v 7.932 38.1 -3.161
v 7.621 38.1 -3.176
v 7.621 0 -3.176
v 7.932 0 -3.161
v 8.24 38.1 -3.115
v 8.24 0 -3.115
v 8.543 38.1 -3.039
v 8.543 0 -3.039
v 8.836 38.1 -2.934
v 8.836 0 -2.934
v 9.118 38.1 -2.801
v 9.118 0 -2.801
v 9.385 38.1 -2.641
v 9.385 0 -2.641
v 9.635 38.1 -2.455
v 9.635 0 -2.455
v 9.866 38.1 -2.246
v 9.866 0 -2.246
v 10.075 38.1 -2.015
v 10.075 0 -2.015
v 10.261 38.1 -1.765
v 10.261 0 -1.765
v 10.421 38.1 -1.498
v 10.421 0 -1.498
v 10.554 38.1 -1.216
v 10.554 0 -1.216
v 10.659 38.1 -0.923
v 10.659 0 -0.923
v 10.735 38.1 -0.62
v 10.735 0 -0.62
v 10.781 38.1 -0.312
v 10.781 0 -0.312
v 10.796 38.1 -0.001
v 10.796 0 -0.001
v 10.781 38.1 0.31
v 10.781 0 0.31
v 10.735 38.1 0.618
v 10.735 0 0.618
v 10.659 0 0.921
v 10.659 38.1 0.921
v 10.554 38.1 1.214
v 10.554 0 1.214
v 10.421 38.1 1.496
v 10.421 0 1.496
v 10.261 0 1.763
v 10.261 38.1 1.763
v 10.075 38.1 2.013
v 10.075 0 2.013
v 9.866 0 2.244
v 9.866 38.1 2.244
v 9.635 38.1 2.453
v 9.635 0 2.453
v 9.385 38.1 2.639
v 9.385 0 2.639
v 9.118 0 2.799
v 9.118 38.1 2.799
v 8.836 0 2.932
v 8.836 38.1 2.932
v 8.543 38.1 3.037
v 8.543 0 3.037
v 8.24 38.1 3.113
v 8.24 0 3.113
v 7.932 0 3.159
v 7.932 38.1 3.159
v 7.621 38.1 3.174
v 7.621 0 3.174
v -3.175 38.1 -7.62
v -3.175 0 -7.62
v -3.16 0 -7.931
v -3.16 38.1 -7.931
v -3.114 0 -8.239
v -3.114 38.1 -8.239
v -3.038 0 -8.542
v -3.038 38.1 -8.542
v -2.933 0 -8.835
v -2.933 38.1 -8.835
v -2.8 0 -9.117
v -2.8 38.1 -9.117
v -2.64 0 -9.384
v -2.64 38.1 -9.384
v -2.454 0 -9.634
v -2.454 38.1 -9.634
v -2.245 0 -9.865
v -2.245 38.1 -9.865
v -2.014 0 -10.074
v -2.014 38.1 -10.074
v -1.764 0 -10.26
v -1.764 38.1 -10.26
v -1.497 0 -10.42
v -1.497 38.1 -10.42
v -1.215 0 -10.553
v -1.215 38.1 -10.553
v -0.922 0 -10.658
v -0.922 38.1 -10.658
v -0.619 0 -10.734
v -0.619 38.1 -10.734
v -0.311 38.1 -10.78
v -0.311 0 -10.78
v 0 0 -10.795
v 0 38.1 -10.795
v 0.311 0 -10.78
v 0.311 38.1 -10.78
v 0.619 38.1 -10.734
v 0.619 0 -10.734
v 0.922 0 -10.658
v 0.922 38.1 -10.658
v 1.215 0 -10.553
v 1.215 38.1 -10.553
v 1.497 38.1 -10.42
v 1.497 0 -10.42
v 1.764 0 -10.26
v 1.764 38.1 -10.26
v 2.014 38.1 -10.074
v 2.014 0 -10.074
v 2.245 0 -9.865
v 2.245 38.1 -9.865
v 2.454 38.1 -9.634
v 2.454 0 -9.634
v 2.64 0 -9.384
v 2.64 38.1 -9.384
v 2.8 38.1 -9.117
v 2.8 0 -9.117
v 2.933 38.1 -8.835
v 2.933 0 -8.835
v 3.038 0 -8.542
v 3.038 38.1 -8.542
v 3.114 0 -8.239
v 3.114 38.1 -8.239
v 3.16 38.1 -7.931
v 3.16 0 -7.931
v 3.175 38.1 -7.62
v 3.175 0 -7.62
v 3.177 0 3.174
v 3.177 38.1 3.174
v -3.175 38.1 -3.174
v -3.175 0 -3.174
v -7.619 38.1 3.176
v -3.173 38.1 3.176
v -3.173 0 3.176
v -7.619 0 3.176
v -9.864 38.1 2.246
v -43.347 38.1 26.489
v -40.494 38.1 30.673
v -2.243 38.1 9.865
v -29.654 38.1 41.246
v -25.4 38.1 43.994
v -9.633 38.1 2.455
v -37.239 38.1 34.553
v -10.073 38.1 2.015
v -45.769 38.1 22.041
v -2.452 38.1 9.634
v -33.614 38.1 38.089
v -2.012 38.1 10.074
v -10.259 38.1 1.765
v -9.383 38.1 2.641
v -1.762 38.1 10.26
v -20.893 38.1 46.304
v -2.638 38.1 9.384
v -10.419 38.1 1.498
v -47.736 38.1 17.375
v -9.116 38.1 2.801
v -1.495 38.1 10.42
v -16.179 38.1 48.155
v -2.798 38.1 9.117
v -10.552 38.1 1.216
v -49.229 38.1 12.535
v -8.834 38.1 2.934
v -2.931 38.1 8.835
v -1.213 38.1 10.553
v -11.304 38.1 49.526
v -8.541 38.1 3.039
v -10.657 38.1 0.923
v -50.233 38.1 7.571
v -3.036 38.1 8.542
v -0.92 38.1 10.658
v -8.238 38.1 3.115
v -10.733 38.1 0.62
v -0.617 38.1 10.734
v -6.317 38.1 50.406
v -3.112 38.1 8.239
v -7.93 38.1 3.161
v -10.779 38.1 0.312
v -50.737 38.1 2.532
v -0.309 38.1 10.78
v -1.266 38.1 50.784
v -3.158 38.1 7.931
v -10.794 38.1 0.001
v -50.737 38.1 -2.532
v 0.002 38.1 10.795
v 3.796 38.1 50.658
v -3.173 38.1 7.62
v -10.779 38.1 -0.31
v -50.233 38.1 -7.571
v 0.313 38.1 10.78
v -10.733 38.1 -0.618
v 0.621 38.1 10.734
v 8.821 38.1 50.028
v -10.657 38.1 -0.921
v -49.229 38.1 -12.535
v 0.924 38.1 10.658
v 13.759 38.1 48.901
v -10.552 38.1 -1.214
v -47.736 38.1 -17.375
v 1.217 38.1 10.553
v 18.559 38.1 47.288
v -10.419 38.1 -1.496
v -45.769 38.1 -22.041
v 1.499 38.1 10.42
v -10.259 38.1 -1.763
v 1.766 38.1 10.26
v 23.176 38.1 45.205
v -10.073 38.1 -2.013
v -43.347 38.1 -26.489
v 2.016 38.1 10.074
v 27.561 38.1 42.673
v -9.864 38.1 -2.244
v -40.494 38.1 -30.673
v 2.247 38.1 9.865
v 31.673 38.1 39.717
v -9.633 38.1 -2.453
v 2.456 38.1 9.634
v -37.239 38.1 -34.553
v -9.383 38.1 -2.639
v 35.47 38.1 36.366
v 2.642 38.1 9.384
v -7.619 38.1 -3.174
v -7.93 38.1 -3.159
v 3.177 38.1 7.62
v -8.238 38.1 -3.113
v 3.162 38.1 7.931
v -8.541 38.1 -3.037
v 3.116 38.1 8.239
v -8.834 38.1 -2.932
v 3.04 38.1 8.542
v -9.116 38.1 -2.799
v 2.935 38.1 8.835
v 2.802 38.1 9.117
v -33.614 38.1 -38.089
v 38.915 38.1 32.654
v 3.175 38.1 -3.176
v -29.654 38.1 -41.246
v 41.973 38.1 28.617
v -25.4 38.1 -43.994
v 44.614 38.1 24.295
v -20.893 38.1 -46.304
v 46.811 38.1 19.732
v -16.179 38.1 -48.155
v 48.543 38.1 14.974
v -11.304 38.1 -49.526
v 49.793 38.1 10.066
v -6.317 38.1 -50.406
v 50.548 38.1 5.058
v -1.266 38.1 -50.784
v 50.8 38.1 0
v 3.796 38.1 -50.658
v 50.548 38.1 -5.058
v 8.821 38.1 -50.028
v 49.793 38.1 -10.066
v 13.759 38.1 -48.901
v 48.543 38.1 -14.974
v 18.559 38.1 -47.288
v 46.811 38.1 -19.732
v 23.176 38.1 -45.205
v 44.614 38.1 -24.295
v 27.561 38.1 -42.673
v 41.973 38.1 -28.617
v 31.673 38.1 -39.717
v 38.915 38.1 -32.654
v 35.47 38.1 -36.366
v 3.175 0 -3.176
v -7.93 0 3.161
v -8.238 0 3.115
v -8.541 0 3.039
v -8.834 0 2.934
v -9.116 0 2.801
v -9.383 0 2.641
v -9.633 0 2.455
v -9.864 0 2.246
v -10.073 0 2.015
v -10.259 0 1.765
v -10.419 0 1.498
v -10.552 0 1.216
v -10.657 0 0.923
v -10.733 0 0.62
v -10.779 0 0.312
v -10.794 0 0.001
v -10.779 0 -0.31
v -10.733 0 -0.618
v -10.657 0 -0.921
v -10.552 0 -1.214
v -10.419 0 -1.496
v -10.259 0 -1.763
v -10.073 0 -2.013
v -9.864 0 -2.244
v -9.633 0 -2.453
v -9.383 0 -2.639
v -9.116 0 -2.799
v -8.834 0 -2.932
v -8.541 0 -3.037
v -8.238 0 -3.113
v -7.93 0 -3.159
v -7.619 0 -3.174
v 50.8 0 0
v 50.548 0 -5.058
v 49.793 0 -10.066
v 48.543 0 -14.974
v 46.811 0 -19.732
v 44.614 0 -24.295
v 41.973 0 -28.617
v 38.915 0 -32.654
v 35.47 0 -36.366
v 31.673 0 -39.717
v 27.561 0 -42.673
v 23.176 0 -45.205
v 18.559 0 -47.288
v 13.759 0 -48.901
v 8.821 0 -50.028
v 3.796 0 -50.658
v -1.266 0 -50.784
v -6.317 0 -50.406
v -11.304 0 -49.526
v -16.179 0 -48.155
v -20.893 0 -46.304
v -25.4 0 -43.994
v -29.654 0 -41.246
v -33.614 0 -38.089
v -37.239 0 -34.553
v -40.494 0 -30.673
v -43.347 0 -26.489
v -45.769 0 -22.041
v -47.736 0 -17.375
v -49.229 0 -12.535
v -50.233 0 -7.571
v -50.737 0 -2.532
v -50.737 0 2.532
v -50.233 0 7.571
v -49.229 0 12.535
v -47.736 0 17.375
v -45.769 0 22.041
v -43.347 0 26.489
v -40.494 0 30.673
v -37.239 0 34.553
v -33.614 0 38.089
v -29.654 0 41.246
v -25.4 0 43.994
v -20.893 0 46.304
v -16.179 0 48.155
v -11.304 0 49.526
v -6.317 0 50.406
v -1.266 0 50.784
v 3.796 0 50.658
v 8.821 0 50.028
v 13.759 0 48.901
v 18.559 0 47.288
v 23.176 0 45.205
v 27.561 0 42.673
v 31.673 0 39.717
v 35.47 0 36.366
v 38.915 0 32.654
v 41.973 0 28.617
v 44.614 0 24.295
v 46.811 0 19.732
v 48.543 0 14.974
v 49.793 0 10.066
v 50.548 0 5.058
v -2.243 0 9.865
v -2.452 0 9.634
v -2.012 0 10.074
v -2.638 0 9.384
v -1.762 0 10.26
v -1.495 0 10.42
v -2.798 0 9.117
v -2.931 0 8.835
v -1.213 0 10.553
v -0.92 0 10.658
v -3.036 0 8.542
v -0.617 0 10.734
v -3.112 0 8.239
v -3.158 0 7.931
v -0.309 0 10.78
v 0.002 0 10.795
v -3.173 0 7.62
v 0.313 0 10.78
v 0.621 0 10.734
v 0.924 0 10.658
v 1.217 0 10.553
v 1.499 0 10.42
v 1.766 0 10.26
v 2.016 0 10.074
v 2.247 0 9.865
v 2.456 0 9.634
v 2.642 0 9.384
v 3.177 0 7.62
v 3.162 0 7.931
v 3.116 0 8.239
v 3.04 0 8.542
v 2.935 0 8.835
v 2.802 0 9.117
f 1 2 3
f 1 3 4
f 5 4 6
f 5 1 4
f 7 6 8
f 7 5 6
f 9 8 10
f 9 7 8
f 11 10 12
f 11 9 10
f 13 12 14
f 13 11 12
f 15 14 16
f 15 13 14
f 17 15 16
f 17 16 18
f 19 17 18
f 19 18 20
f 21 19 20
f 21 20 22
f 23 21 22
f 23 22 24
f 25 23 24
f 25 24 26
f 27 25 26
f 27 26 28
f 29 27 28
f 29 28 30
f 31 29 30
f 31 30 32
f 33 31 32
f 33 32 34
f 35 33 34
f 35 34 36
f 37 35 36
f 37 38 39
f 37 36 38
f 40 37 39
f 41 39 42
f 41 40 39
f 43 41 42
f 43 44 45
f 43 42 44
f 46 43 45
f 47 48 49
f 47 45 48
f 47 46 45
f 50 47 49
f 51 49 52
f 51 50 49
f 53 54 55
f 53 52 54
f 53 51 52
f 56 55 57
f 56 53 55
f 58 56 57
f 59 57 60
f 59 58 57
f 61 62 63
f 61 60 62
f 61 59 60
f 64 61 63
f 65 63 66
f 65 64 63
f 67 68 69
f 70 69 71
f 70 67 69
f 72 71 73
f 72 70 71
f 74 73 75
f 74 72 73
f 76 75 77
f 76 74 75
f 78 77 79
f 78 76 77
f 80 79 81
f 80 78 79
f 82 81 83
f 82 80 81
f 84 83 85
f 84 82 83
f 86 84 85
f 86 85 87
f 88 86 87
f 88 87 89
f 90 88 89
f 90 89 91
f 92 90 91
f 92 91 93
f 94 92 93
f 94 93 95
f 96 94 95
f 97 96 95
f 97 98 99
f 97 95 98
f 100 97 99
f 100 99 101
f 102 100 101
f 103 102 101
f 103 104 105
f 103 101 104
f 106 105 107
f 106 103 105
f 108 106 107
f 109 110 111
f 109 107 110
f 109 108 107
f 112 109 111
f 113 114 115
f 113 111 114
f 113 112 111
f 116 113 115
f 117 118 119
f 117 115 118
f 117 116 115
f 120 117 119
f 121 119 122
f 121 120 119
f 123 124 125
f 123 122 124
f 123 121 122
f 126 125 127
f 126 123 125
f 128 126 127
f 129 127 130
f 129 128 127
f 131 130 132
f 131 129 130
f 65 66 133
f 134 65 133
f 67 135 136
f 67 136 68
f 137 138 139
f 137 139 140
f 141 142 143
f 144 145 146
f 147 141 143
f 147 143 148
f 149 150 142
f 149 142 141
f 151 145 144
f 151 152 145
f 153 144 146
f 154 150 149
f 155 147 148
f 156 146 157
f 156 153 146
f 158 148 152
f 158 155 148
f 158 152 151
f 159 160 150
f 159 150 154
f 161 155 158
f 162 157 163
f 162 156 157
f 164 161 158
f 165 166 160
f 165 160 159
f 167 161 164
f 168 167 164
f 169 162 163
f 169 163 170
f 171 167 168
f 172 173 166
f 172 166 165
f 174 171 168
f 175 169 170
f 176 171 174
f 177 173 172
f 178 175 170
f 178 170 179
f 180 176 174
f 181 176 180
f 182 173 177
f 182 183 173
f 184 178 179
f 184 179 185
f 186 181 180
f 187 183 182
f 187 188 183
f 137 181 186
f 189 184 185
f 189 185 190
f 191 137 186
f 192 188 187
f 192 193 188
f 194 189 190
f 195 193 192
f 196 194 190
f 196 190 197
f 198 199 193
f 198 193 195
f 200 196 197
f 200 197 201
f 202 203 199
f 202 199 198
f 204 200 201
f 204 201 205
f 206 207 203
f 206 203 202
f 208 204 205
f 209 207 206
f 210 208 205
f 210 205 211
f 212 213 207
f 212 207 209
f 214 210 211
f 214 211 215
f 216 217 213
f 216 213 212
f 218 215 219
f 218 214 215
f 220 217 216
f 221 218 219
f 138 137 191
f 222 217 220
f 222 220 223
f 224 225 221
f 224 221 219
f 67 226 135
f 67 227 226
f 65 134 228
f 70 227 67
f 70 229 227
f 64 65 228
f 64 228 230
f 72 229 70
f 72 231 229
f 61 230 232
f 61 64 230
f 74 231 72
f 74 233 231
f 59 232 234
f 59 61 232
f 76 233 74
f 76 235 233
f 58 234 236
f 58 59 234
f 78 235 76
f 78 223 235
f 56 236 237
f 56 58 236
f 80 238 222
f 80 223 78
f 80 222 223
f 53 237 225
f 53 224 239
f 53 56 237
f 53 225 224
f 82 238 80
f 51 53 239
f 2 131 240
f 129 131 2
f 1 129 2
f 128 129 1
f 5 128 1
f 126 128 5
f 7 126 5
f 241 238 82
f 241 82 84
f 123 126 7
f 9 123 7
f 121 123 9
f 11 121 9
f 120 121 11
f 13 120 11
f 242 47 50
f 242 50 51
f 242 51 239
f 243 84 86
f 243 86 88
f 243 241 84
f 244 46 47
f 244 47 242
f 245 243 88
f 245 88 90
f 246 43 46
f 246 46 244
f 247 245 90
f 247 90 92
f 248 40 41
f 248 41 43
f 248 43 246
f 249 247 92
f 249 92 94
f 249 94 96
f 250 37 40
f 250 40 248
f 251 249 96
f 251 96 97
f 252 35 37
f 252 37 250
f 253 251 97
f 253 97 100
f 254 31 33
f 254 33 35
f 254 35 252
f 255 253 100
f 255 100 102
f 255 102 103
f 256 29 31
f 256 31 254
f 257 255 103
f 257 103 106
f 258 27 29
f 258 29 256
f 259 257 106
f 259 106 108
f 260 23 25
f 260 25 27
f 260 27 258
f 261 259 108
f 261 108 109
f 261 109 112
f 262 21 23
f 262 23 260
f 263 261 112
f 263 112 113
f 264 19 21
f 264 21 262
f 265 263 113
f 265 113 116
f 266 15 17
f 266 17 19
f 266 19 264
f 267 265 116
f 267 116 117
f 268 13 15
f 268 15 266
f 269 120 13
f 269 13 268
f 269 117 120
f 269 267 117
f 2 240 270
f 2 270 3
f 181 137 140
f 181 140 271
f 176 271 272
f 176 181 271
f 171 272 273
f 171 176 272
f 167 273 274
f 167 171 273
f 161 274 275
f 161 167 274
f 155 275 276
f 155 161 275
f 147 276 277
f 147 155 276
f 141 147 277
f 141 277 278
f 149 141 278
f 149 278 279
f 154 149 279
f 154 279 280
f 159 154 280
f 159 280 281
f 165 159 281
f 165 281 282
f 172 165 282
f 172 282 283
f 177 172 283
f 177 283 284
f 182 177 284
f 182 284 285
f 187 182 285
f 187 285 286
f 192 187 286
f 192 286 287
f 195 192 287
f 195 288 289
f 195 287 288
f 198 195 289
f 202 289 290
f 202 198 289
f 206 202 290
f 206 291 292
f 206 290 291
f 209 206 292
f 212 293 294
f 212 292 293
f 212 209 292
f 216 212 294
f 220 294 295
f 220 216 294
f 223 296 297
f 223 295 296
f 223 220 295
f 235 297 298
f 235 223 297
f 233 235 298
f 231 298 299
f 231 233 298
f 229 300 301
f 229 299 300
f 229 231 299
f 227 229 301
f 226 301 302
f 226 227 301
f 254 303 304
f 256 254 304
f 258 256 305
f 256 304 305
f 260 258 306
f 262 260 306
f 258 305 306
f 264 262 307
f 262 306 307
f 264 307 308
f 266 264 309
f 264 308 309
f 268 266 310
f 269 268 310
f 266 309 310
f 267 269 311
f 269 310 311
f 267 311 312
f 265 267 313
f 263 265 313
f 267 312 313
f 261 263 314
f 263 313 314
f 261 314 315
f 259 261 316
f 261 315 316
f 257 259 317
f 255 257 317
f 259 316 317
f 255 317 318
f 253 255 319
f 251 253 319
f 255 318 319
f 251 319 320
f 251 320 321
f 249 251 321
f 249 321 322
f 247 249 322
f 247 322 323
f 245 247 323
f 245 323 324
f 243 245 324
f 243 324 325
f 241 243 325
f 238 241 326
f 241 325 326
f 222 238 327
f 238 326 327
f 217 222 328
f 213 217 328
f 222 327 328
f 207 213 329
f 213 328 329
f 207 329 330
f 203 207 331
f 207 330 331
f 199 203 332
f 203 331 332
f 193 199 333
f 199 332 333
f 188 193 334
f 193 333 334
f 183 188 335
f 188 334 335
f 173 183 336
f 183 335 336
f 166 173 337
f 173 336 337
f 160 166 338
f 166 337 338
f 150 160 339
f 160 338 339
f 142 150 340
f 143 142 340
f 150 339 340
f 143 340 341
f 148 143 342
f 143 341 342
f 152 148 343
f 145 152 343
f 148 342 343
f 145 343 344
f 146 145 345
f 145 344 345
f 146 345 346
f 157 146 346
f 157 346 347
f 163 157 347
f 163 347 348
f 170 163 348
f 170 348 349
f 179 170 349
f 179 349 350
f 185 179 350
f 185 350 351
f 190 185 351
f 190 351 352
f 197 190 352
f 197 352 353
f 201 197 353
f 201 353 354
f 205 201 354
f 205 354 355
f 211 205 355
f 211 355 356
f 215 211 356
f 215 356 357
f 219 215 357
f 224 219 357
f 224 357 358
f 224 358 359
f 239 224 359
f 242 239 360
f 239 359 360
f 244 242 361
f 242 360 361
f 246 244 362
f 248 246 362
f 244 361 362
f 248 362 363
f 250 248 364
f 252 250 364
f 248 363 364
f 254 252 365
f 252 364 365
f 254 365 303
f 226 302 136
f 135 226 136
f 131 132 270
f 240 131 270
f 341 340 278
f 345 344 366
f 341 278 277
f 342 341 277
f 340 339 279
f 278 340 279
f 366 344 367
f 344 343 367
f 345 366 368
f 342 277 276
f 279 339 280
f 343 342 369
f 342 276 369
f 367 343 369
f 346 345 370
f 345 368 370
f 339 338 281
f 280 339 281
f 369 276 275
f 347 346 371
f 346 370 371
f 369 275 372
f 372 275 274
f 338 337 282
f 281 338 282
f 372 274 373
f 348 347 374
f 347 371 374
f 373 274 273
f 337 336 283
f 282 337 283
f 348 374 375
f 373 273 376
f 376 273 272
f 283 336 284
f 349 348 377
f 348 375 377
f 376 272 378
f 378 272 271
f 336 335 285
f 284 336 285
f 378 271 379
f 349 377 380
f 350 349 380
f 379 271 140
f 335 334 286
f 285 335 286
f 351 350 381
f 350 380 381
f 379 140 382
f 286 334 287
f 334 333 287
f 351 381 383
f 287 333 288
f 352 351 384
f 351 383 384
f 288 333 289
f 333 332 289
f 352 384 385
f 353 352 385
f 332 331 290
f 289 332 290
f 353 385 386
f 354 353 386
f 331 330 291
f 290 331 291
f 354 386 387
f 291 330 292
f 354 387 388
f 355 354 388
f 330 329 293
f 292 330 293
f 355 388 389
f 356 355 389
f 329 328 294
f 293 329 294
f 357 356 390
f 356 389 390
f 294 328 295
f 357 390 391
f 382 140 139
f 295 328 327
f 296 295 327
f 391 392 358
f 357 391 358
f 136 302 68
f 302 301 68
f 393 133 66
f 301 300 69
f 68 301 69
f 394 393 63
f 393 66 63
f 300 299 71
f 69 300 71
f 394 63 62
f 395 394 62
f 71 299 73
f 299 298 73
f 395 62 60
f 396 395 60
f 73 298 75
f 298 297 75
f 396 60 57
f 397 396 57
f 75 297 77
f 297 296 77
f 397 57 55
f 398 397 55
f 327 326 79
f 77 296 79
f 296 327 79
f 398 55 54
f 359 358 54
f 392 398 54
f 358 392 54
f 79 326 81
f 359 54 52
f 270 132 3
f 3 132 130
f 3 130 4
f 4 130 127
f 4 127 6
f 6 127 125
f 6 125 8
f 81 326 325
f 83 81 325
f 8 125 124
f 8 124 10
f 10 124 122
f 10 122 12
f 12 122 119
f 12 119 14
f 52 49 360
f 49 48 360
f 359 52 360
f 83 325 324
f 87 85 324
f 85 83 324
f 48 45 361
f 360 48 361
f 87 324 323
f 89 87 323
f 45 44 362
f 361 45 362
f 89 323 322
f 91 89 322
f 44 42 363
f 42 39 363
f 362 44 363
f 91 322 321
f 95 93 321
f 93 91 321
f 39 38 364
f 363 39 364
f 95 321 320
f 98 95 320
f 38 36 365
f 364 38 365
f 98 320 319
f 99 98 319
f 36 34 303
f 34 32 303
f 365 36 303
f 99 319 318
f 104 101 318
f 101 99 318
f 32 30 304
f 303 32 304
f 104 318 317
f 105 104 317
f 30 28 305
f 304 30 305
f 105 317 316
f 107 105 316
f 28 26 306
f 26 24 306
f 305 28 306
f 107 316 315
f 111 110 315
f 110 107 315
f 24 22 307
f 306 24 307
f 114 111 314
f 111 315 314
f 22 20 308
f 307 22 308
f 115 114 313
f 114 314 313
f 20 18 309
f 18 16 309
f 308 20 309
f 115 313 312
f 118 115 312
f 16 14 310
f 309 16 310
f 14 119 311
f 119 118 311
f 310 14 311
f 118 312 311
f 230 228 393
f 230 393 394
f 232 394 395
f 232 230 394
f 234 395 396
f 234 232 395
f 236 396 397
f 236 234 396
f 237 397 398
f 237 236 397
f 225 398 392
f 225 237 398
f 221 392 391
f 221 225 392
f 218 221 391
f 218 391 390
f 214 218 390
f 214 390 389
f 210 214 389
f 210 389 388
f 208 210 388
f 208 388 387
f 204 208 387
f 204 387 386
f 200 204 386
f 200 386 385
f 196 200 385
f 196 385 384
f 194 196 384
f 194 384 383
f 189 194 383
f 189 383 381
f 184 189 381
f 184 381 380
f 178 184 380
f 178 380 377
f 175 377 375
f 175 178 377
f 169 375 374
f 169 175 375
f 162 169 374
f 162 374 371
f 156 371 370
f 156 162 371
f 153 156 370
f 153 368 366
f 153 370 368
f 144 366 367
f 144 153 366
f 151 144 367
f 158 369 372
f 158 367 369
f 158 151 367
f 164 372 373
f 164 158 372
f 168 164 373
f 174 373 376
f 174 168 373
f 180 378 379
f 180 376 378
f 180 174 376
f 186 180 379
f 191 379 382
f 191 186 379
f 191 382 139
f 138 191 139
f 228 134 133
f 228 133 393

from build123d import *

# Parameters (mm, degrees)
SKETCH1_R           = 50.8
SKETCH1_R_2         = 3.175
BOSS_EXTRUDE1_DEPTH = 38.1
CUT_EXTRUDE1_DEPTH  = 39.1


with BuildPart() as part:
    # Sketch1 → Boss-Extrude1 (new body)
    with BuildSketch(Plane(origin=(0, 0, 0), x_dir=(1, 0, 0), z_dir=(0, 1, 0))):
        Circle(SKETCH1_R)
        Circle(SKETCH1_R_2, mode=Mode.SUBTRACT)
    extrude(amount=BOSS_EXTRUDE1_DEPTH)

    # Sketch2 → Cut-Extrude1 (cut, through all)
    with BuildSketch(Plane(origin=(0, 38.1, 0), x_dir=(1, 0, 0), z_dir=(0, 1, 0))):
        with BuildLine():
            Line((-3.175, 3.174), (-3.175, 7.620000001))
            ThreePointArc((-3.175, 7.620000001), (0, 10.795), (3.175, 7.62))
            Line((3.175, 7.62), (3.175, 3.176))
            Line((3.175, 3.176), (7.621, 3.176))
            ThreePointArc((7.621, 3.176), (10.796, 0.001), (7.621, -3.174))
            Line((7.621, -3.174), (3.177, -3.174))
            Line((3.177, -3.174), (3.177, -7.62))
            ThreePointArc((3.177, -7.62), (0.002, -10.795), (-3.173, -7.62))
            Line((-3.173, -7.62), (-3.173, -3.176))
            Line((-3.173, -3.176), (-7.619, -3.176))
            ThreePointArc((-7.619, -3.176), (-10.794, -0.001), (-7.619, 3.174))
            Line((-7.619, 3.174), (-3.175, 3.174))
        make_face()
    extrude(amount=-CUT_EXTRUDE1_DEPTH, mode=Mode.SUBTRACT)


solid = part.part
